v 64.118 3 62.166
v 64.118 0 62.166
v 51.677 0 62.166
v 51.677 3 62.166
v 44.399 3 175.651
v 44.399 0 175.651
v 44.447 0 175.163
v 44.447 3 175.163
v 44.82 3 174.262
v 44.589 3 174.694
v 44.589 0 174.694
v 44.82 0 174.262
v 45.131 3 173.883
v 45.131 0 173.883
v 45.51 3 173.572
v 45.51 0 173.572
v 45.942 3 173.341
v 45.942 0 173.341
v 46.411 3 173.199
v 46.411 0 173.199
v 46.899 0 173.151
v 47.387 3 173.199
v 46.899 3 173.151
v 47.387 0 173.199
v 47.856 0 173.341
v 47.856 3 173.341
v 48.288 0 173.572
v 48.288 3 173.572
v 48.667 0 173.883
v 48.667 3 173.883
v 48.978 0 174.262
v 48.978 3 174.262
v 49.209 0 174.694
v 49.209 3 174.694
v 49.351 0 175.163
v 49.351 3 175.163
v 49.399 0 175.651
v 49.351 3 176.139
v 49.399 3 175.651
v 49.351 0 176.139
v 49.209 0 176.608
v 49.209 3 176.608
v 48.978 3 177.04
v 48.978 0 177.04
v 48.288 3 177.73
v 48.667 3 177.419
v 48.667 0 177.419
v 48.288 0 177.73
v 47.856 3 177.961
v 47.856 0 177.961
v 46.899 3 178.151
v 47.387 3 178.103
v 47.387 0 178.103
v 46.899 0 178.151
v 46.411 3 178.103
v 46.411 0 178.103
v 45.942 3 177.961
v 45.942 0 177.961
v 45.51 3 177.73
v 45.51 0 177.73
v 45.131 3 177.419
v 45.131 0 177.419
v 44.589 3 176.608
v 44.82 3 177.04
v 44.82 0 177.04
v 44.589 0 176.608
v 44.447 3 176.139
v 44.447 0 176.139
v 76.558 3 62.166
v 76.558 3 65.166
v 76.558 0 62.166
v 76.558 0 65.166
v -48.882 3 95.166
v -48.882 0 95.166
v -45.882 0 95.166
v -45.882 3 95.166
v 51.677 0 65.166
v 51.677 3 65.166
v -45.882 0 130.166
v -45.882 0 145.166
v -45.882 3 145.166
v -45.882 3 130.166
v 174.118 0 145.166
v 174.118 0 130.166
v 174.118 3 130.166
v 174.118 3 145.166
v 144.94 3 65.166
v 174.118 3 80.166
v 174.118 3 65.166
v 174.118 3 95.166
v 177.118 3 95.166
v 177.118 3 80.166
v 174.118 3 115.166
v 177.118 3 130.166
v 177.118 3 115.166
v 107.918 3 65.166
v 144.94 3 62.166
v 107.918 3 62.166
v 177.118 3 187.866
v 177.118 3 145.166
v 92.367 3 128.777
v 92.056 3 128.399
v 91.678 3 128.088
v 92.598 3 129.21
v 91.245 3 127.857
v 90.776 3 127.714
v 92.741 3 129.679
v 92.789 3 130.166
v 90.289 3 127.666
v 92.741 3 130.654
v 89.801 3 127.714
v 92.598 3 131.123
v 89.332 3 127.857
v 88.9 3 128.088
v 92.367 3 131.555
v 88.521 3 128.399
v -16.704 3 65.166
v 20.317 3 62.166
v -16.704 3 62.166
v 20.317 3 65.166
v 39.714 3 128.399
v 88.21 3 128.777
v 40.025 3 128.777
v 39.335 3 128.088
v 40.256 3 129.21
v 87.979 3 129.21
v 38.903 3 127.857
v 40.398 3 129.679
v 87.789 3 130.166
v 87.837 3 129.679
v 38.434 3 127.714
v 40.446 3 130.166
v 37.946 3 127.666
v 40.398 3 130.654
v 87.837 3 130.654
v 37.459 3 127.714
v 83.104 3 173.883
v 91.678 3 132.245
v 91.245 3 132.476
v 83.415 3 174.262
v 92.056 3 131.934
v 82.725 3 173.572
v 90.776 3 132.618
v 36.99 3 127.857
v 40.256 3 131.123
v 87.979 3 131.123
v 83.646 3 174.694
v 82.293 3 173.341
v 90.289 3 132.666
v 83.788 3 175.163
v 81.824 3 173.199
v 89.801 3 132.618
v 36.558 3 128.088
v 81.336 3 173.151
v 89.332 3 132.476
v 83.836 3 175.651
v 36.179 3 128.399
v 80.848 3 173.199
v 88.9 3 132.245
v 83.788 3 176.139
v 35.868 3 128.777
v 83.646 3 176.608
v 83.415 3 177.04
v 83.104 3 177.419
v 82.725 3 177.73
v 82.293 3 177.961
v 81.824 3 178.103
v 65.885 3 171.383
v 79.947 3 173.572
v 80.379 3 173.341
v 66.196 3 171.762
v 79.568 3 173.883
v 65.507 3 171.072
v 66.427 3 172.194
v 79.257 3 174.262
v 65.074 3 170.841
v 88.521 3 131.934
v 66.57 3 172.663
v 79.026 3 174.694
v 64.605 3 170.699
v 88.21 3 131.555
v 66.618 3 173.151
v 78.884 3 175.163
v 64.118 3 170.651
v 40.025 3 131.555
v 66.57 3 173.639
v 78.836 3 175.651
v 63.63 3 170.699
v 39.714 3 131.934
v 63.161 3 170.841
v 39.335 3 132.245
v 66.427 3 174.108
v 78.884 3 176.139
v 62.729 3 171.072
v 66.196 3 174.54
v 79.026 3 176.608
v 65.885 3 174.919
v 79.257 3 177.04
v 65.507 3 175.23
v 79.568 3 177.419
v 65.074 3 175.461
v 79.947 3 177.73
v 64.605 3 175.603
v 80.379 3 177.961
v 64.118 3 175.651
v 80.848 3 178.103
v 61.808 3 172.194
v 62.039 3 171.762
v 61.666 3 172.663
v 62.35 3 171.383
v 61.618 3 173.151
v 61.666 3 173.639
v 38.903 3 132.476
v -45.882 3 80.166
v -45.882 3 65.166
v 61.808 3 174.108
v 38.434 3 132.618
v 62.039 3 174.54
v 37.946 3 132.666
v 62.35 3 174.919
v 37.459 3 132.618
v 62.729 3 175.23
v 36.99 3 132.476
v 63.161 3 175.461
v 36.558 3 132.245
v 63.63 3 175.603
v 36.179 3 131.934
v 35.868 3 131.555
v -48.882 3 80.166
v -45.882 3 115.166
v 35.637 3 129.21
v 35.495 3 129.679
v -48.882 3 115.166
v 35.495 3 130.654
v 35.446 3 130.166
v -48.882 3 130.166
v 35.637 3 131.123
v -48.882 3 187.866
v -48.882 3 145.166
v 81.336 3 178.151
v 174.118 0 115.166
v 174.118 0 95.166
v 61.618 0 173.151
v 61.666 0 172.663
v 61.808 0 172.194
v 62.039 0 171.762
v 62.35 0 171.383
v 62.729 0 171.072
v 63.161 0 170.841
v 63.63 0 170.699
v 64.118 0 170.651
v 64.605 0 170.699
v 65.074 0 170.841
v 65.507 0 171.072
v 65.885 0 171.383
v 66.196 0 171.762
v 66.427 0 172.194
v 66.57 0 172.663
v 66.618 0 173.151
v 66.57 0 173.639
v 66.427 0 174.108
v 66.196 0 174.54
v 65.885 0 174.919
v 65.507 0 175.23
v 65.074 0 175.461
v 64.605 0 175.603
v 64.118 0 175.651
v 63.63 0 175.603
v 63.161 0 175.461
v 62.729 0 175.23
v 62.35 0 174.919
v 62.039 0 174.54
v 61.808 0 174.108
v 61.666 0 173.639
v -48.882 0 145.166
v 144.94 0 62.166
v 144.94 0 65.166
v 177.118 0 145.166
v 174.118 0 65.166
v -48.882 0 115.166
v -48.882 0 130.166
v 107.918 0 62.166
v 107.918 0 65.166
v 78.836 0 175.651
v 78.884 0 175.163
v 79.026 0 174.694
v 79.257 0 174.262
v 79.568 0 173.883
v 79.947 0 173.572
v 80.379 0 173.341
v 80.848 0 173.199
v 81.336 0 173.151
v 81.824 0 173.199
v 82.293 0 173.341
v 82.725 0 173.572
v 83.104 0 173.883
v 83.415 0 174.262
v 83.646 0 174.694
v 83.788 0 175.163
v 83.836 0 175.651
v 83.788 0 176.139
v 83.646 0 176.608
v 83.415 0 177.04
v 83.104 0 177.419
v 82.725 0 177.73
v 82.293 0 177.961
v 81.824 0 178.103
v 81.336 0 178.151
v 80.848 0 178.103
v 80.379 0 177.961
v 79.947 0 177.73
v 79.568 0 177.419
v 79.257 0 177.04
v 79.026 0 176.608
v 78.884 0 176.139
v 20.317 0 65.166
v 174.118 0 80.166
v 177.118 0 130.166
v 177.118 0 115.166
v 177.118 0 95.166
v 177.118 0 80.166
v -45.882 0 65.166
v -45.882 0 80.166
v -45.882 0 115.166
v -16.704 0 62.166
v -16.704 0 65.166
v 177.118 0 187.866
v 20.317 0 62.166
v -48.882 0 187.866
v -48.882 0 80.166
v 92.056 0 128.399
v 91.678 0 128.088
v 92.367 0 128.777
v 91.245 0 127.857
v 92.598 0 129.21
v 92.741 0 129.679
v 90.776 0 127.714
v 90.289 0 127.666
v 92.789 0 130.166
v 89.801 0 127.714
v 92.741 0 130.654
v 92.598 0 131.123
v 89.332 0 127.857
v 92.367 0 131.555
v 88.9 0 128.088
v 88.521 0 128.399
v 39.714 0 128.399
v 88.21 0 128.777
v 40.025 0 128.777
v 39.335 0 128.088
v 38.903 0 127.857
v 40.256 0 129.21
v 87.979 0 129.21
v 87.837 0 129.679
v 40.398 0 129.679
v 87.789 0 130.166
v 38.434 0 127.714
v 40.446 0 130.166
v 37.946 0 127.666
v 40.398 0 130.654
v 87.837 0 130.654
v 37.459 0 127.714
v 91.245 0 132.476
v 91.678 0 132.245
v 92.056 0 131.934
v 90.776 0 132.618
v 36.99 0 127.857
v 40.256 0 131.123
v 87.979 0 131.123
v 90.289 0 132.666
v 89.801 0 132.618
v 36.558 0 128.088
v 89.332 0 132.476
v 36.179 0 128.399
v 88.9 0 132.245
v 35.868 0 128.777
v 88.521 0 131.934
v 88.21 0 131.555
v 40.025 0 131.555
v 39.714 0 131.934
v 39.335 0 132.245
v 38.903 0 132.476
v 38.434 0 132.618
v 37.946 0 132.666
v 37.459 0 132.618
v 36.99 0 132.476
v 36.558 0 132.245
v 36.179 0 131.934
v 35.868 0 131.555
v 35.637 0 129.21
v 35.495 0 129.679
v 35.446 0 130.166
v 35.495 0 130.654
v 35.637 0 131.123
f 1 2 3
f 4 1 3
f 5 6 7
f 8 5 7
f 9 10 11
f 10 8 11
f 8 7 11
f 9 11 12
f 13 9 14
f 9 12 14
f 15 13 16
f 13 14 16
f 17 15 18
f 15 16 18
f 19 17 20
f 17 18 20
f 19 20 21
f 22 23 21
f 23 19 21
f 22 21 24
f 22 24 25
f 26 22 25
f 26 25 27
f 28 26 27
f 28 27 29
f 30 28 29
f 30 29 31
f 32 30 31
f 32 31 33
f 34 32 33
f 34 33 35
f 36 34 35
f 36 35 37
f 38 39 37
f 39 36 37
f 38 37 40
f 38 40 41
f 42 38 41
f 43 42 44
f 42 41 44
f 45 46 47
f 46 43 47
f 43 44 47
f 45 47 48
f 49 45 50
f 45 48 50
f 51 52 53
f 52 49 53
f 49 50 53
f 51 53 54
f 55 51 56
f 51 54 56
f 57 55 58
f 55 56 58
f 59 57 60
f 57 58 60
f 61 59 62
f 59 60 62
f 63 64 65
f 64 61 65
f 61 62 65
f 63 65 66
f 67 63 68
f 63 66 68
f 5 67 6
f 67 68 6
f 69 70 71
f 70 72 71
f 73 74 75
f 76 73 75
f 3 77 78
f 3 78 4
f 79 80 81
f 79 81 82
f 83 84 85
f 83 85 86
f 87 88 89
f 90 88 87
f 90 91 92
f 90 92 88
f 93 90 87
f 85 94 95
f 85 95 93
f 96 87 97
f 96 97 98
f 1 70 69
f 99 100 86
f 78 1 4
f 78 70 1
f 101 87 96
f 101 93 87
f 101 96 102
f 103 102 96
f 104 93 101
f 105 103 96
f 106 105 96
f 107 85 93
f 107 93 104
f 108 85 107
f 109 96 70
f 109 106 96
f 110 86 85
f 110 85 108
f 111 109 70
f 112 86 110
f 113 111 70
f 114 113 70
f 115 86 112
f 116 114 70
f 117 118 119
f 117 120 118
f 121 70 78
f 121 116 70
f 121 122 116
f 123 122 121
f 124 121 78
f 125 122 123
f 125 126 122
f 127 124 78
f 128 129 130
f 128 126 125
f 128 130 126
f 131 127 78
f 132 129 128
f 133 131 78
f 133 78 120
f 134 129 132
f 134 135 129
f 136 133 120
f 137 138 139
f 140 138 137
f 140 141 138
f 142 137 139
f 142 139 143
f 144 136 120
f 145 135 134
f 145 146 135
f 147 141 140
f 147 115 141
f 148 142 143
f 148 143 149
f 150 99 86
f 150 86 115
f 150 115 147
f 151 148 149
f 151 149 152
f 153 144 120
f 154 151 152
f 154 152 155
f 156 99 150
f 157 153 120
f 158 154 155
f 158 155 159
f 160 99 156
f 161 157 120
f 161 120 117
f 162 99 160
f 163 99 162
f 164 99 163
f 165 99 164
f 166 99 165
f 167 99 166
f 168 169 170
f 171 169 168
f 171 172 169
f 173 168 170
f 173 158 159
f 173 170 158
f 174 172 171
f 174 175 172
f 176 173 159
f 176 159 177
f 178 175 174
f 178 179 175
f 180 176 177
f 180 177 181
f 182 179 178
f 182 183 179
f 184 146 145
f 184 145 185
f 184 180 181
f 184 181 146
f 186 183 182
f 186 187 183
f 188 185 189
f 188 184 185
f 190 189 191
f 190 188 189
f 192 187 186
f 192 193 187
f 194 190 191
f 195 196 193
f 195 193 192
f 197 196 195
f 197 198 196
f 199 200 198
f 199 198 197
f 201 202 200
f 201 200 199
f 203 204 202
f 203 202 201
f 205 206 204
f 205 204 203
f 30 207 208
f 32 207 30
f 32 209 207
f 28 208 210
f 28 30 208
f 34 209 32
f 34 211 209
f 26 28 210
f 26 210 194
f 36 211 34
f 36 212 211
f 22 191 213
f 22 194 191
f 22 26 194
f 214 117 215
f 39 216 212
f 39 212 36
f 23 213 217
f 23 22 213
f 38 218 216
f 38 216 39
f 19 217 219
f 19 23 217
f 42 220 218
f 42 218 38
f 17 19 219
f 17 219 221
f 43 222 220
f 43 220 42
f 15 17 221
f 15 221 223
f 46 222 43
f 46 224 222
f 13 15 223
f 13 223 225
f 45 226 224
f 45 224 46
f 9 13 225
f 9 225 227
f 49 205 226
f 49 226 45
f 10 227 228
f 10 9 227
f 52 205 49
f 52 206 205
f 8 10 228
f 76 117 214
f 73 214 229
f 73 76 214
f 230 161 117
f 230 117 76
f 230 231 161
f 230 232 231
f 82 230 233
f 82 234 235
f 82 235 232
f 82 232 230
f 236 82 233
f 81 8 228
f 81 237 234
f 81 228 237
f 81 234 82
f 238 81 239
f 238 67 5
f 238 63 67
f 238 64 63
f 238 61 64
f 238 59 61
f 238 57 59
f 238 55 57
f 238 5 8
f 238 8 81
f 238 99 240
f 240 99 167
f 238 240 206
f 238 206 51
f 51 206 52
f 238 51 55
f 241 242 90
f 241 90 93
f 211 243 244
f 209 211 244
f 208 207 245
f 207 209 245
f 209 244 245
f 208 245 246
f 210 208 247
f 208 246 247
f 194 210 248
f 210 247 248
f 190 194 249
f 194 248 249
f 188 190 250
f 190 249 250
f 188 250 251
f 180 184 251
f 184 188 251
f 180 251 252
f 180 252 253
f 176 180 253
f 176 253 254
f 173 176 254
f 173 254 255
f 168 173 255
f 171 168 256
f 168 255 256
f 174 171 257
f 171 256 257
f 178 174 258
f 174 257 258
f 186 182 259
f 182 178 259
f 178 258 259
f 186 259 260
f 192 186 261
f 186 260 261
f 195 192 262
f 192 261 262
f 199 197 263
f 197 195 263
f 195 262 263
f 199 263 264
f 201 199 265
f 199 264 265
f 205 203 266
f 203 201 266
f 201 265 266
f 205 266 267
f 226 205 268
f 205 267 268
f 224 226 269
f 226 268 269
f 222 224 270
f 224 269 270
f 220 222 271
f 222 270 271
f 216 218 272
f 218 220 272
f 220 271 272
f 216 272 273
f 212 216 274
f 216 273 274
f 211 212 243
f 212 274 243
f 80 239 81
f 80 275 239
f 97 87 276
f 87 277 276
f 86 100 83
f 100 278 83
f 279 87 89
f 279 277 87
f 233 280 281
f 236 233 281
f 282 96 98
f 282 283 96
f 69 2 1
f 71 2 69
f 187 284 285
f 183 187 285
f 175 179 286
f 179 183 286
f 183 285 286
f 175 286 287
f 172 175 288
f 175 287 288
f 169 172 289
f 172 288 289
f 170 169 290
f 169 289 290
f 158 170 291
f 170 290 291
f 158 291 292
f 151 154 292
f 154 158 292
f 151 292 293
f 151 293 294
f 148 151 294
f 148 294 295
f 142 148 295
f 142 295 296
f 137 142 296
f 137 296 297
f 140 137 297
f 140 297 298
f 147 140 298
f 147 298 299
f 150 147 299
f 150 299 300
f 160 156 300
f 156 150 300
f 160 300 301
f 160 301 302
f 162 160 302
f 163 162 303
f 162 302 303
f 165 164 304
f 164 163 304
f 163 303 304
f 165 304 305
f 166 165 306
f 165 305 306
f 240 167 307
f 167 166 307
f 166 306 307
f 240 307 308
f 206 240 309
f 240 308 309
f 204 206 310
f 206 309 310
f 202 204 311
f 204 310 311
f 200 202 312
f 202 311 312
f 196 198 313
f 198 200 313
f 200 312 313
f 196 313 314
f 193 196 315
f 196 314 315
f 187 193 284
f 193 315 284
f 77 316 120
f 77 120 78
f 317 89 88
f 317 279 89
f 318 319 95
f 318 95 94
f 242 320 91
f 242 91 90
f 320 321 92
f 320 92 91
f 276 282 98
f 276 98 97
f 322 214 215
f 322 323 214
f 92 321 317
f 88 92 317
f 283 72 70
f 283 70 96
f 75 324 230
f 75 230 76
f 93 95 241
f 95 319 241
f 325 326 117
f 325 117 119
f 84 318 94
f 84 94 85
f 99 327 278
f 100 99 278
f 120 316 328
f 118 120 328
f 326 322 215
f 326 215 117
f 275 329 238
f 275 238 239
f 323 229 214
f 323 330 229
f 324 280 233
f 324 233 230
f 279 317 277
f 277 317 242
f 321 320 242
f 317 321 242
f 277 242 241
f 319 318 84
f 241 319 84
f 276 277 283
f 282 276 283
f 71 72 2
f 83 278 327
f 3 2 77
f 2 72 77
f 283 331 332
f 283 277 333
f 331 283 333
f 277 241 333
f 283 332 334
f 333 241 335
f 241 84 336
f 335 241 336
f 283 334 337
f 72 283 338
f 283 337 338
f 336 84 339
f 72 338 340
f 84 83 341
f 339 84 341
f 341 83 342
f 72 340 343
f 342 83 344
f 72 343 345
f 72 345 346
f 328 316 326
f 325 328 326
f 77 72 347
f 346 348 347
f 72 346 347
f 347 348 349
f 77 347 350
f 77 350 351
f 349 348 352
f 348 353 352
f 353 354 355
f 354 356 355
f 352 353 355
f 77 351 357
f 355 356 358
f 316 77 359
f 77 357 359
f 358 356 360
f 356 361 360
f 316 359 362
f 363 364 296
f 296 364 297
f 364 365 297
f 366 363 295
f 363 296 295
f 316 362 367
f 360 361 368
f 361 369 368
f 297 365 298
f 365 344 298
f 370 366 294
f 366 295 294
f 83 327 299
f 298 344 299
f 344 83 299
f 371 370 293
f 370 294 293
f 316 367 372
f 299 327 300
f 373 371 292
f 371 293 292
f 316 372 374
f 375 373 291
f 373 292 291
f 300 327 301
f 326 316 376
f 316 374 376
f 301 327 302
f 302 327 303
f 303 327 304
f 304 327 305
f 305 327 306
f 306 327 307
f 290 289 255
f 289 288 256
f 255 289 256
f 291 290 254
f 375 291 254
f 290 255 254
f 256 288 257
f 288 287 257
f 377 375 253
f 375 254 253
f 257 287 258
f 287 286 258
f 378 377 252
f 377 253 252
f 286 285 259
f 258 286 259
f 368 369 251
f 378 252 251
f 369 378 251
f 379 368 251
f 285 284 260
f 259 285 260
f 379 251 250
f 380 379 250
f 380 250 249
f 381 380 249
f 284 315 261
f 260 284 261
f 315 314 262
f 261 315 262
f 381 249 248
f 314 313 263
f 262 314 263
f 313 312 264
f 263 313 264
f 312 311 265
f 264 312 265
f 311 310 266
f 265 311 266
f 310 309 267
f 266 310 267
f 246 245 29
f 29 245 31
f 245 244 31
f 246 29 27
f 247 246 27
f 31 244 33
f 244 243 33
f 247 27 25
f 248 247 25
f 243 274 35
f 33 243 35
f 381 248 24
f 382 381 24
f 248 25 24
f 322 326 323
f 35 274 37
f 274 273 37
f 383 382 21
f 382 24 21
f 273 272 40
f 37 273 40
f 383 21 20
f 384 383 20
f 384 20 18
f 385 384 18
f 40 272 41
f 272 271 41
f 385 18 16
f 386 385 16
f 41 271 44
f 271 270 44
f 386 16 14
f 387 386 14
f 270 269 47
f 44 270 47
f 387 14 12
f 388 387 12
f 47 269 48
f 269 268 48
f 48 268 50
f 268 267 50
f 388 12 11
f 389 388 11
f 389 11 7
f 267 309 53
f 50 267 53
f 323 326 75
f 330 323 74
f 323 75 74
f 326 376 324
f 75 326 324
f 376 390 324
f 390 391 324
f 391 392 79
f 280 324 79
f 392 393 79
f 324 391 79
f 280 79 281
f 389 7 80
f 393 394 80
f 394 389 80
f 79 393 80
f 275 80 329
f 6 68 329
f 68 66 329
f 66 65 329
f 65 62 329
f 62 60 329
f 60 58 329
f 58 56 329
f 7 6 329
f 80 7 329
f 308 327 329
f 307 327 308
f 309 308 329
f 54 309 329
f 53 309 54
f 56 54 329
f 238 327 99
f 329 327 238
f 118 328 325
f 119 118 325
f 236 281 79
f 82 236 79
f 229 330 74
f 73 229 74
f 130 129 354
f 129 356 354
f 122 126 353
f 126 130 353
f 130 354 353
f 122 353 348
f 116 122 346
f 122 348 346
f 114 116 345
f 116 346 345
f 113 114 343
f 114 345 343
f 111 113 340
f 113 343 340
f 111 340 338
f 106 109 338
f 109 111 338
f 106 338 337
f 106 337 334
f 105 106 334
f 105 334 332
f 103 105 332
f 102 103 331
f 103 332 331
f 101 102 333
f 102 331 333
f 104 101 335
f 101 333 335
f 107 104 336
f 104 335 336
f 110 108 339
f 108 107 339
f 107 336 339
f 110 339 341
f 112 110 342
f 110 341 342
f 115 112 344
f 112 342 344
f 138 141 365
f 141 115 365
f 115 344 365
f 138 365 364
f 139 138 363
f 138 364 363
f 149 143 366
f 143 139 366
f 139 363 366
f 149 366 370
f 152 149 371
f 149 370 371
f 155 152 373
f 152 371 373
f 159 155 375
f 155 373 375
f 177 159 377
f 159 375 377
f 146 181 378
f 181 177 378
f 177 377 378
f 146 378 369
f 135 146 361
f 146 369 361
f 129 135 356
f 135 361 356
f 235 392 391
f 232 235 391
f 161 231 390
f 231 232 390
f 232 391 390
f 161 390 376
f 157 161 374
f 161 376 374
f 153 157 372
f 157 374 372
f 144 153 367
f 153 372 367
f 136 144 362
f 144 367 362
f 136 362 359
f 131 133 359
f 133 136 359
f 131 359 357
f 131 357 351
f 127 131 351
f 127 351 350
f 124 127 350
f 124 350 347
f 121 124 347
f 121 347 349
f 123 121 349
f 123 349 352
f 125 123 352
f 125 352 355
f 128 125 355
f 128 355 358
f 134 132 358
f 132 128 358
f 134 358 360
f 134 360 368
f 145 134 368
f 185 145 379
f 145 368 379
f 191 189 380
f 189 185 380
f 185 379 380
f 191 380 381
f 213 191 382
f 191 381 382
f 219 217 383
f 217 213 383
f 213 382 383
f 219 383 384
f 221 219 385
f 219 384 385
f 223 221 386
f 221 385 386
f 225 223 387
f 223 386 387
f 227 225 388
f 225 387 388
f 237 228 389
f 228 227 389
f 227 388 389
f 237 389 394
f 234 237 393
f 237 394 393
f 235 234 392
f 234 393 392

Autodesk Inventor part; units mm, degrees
ref_plane "YZ Plane" through (0, 0, 0) normal (1, 0, 0) x (0, 1, 0)
ref_plane "XZ Plane" through (0, 0, 0) normal (0, 1, 0) x (-1, 0, 0)
ref_plane "XY Plane" through (0, 0, 0) normal (0, 0, 1) x (1, 0, 0)
sketch "Sketch1" plane through (0, 0, 0) normal (0, 1, 0) x (-1, 0, 0)
  line L0 (16.7044, 65.1664) -> (16.7044, 62.1664)
  line L1 (-20.3174, 65.1664) -> (-20.3174, 62.1664)
  line L2 (-51.677, 65.1664) -> (-51.677, 62.1664)
  line L3 (-144.9395, 65.1664) -> (-144.9395, 62.1664)
  line L4 (-107.9177, 65.1664) -> (-107.9177, 62.1664)
  line L5 (-76.5581, 65.1664) -> (-76.5581, 62.1664)
  line L6 (45.8824, 65.1664) -> (16.7044, 65.1664)
  line L7 (-64.1176, 62.1664) -> (-51.677, 62.1664)
  line L8 (-20.3174, 62.1664) -> (16.7044, 62.1664)
  line L9 (16.7044, 62.1664) -> (-20.3174, 62.1664)
  line L10 (-20.3174, 65.1664) -> (-51.677, 65.1664)
  line L11 (-51.677, 62.1664) -> (-76.5581, 62.1664)
  line L12 (-107.9177, 62.1664) -> (-144.9395, 62.1664)
  line L13 (-64.1176, 62.1664) -> (-76.5581, 62.1664)
  line L14 (-76.5581, 65.1664) -> (-107.9177, 65.1664)
  line L15 (-144.9395, 65.1664) -> (-174.1176, 65.1664)
  line L16 (48.8824, 80.1664) -> (48.8824, 95.1664)
  line L17 (48.8824, 95.1664) -> (45.8824, 95.1664)
  line L18 (48.8824, 80.1664) -> (45.8824, 80.1664)
  line L19 (48.8824, 115.1664) -> (45.8824, 115.1664)
  line L20 (48.8824, 130.1664) -> (45.8824, 130.1664)
  line L21 (-177.1176, 130.1664) -> (-174.1176, 130.1664)
  line L22 (-177.1176, 115.1664) -> (-174.1176, 115.1664)
  line L23 (-177.1176, 95.1664) -> (-174.1176, 95.1664)
  line L24 (-177.1176, 80.1664) -> (-174.1176, 80.1664)
  line L25 (45.8824, 80.1664) -> (45.8824, 65.1664)
  line L26 (48.8824, 115.1664) -> (48.8824, 130.1664)
  line L27 (45.8824, 145.1664) -> (45.8824, 130.1664)
  line L28 (45.8824, 115.1664) -> (45.8824, 95.1664)
  line L29 (-174.1176, 65.1664) -> (-174.1176, 80.1664)
  line L30 (-174.1176, 95.1664) -> (-174.1176, 115.1664)
  line L31 (-174.1176, 130.1664) -> (-174.1176, 145.1664)
  line L32 (-177.1176, 80.1664) -> (-177.1176, 95.1664)
  line L33 (-177.1176, 115.1664) -> (-177.1176, 130.1664)
  line L34 (-213.0378, 187.8664) -> (84.2595, 187.8664)
  line L35 (-177.1176, 187.8664) -> (-177.1176, 145.1664)
  line L36 (-177.1176, 145.1664) -> (-174.1176, 145.1664)
  line L37 (48.8824, 187.8664) -> (48.8824, 145.1664)
  line L38 (48.8824, 145.1664) -> (45.8824, 145.1664)
  circle A0 centre (-81.336, 175.651) radius 2.5
  circle A1 centre (-90.2887, 130.1664) radius 2.5
  circle A2 centre (-64.1176, 173.151) radius 2.5
  circle A3 centre (-46.8991, 175.651) radius 2.5
  circle A4 centre (-37.9465, 130.1664) radius 2.5
  point P0 (0, 0)
  point P1 (48.8824, 62.1664)
  point P2 (-126.4286, 62.1664)
  point P3 (-161.0285, 65.1664)
  point P4 (-177.1176, 122.6664)
  point P5 (48.8824, 122.6664)
  point P6 (-76.5581, 63.6664)
  point P7 (-51.677, 63.6664)
  dimension "d1" = 15
  dimension "d3" = 220
  dimension "d4" = 226
  dimension "d5" = 20
  dimension "d6" = 15
  dimension "d7" = 15
  dimension "d9" = 15
  dimension "d10" = 29.178
  dimension "d11" = 37.0218
  dimension "d12" = 31.3596
  dimension "d13" = 24.8811
  dimension "d14" = 31.3596
  dimension "d16" = 37.0218
  dimension "d17" = 29.178
  dimension "d18" = 15
  dimension "d19" = 15
  dimension "d20" = 20
  dimension "d21" = 15
  dimension "d22" = 15
  dimension "d23" = 3
  dimension "d24" = 3
  dimension "d27" = 122.7
  dimension "d28" = 5
  dimension "d29" = 5
  dimension "d30" = 65
  dimension "d31" = 5
extrude "Extrusion1" add sketch "Sketch1" along normal blind 3
properties part number "mieng_mat_3mm"
